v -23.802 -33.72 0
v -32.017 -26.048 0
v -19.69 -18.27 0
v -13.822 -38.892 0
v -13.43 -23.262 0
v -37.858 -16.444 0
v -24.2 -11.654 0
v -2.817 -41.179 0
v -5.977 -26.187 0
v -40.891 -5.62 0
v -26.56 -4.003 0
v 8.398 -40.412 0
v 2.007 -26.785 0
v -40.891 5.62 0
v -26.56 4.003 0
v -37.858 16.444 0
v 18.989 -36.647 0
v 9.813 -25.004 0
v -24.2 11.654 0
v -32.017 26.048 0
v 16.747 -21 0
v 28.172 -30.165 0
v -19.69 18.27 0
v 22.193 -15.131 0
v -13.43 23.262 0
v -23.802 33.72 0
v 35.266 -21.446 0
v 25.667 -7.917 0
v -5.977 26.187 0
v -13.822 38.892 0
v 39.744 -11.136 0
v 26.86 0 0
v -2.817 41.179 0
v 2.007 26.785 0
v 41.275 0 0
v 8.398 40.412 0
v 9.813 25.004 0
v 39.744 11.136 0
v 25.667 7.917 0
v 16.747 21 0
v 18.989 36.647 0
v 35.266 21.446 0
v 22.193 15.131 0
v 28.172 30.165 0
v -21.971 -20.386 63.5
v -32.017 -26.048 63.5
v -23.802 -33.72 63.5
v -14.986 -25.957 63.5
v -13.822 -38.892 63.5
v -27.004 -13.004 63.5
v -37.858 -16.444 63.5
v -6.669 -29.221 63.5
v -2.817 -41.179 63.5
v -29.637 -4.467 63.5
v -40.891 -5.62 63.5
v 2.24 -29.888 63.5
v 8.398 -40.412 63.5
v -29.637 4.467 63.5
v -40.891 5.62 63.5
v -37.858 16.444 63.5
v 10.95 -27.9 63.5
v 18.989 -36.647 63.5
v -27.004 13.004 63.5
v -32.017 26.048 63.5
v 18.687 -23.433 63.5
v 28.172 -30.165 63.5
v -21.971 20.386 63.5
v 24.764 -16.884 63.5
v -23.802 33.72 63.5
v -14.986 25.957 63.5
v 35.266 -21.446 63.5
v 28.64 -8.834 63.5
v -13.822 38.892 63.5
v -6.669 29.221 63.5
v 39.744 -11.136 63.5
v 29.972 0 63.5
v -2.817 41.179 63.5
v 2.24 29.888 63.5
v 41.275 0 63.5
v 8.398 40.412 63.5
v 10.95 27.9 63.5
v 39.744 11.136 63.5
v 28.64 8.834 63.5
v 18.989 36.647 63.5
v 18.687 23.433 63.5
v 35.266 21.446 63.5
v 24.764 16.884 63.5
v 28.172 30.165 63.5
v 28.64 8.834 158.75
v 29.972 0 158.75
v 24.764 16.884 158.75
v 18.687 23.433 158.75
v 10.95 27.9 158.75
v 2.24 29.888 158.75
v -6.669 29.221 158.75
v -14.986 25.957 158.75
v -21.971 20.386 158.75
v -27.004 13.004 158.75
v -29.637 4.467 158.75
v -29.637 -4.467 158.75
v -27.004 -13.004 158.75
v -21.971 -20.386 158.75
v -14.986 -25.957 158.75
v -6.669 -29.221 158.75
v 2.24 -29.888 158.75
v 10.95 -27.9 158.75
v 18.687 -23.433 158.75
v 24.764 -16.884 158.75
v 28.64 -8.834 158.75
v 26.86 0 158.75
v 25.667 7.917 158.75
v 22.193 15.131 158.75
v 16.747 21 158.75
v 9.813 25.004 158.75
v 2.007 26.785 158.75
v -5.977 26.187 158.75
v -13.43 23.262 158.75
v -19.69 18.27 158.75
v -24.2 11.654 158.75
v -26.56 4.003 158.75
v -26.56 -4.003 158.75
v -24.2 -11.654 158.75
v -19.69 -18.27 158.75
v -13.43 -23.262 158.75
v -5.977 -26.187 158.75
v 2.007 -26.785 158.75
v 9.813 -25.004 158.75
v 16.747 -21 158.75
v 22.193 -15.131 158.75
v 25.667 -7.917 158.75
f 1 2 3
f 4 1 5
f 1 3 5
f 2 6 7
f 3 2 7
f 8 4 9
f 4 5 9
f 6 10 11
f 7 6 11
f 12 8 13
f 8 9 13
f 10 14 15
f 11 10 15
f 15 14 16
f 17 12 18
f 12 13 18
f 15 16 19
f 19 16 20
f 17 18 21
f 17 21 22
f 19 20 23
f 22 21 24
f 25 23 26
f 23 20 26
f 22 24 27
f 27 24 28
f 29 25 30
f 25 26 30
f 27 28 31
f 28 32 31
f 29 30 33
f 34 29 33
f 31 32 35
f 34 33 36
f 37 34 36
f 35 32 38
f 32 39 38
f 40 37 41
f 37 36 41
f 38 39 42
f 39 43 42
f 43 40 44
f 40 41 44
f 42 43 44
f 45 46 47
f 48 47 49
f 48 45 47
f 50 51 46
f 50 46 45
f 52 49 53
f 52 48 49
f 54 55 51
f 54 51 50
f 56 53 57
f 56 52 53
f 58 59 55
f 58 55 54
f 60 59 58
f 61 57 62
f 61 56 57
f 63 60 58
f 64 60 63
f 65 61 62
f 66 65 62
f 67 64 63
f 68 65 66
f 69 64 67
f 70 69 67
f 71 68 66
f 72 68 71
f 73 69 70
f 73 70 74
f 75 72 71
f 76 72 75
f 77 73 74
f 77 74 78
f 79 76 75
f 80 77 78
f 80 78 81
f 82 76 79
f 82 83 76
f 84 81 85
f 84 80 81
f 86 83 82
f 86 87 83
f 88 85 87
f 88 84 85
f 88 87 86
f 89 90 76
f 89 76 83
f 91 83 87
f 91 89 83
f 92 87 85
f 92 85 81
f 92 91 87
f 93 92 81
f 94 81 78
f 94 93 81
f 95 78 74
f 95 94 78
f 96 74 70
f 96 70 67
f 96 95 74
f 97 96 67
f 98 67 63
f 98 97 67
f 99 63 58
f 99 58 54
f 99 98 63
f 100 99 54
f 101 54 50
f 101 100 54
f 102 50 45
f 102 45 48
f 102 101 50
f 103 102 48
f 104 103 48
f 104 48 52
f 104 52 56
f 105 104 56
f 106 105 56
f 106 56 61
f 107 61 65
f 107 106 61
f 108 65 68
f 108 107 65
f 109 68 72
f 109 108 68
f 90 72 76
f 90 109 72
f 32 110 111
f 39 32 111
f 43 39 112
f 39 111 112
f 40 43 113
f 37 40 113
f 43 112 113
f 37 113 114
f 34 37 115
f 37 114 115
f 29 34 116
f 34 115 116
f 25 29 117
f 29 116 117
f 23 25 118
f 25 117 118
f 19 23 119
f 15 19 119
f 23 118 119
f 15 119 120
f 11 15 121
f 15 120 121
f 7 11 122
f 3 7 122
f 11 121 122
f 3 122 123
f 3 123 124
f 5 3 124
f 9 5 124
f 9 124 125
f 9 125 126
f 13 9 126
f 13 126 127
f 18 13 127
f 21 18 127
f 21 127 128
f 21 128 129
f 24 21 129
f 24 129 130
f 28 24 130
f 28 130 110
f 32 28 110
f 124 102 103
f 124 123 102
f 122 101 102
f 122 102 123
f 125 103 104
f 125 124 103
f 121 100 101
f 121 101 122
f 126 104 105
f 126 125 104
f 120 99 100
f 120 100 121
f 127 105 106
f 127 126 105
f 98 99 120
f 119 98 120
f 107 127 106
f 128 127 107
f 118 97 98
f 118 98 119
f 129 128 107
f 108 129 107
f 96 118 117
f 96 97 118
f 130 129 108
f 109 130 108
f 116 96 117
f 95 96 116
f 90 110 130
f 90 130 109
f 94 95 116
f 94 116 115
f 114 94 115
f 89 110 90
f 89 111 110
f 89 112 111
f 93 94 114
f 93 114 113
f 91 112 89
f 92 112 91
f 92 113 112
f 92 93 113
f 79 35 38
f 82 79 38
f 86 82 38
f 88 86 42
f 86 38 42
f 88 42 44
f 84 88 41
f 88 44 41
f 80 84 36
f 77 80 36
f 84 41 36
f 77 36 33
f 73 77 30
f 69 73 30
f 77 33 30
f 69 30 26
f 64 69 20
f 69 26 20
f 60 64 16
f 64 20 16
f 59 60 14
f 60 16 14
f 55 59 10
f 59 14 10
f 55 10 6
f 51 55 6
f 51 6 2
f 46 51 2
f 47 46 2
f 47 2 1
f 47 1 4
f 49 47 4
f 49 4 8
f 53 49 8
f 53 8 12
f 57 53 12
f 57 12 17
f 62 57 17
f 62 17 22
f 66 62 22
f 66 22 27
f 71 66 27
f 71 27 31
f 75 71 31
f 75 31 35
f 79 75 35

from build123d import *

# Parameters (mm, degrees)
F0_R     = 41.275
F1_DEPTH = 158.75
F2_R     = 41.275
F2_R_2   = 29.972
F3_DEPTH = 95.25
F4_R     = 26.8605
F5_DEPTH = 158.751


with BuildPart() as f1:
    # F0 (on Top) → F1 (new body)
    with BuildSketch(Plane.XY):
        Circle(F0_R)
    extrude(amount=F1_DEPTH)

    # F2 (on face) → F3 (cut)
    with BuildSketch(Plane.XY.offset(158.75)):
        Circle(F2_R)
        Circle(F2_R_2, mode=Mode.SUBTRACT)
    extrude(amount=-F3_DEPTH, mode=Mode.SUBTRACT)

    # F4 (on face) → F5 (cut, through all)
    with BuildSketch(Plane.XY.offset(158.75)):
        Circle(F4_R)
    extrude(amount=-F5_DEPTH, mode=Mode.SUBTRACT)


solid = f1.part
